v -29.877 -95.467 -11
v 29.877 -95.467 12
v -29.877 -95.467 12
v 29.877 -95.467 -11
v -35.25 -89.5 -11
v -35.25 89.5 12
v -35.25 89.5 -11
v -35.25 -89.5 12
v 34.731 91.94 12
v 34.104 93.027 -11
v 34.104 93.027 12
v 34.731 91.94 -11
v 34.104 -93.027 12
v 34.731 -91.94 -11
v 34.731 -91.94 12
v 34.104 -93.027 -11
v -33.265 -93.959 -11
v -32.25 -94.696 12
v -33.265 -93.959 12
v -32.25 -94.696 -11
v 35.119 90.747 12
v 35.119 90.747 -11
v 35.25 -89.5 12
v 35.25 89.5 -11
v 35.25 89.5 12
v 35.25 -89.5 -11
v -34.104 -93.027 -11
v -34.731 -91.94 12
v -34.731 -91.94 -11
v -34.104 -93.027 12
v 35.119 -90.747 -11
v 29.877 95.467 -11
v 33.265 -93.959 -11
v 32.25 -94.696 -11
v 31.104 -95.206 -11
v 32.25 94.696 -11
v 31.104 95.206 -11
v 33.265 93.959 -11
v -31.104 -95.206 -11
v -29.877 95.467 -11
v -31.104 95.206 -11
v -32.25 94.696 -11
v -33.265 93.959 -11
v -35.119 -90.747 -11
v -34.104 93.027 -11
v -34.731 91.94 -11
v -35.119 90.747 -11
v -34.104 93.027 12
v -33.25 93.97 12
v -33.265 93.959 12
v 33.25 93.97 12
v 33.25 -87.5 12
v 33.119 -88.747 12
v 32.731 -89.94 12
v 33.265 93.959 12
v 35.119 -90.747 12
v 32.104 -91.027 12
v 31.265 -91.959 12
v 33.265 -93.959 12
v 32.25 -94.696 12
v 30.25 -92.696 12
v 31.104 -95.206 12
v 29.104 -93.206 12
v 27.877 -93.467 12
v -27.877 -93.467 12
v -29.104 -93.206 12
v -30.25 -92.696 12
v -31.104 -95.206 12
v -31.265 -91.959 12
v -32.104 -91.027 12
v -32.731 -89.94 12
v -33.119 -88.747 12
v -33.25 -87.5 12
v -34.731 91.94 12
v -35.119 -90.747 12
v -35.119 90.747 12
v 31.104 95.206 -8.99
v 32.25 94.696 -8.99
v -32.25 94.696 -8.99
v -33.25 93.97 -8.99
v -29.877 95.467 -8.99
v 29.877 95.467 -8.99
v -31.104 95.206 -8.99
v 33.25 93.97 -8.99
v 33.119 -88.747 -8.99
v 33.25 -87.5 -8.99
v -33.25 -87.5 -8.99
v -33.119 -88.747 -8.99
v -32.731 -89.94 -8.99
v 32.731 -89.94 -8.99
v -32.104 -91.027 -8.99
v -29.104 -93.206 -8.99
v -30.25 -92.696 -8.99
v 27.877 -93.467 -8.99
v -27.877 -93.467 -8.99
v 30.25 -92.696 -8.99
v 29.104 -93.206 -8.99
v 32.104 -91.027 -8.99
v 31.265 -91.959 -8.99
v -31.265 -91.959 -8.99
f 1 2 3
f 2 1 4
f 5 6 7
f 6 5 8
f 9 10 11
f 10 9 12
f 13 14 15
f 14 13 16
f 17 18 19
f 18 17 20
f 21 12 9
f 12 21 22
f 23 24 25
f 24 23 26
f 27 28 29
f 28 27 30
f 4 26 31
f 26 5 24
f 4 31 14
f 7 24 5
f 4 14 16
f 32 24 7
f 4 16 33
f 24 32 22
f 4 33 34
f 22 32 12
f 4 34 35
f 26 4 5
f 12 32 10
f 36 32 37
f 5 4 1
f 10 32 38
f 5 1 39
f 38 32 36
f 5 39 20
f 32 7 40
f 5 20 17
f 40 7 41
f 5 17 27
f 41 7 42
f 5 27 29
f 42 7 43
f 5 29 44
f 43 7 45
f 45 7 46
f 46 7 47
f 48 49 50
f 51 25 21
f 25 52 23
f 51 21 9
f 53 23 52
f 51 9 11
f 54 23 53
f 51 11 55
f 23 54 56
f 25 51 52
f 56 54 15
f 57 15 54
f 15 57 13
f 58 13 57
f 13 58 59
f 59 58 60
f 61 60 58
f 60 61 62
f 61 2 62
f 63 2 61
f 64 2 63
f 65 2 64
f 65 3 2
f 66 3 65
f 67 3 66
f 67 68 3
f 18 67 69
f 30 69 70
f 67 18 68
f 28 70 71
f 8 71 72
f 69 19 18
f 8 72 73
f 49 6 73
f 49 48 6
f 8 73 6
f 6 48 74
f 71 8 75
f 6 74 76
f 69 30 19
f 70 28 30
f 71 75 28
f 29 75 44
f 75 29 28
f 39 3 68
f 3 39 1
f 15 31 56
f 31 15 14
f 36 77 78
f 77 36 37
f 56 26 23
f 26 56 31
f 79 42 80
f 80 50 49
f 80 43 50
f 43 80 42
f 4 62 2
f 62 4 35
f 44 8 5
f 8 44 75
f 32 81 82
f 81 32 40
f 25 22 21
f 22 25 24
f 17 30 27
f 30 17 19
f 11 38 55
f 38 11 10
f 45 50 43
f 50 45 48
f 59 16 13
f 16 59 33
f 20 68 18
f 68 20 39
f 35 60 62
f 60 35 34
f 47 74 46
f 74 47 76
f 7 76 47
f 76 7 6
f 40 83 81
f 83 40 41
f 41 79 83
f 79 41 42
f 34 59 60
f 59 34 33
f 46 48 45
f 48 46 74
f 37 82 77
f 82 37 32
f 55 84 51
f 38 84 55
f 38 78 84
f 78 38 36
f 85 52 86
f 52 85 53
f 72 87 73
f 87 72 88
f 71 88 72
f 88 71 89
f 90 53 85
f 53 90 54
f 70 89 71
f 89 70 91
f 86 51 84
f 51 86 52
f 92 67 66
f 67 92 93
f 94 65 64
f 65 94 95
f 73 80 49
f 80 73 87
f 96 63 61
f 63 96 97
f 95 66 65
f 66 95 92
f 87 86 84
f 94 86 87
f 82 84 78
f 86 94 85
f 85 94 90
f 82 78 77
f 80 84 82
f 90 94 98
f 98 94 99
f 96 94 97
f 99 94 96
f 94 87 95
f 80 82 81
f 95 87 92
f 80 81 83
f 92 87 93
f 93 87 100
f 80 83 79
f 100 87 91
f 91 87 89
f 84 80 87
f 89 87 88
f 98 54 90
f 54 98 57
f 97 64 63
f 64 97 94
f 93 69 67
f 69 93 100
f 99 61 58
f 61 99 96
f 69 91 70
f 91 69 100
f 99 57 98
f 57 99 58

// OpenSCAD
$fn = 30;

case_inner_width = 66.5;
case_inner_length = 175;
case_inner_height = 20;

shell_thickness = 2;
minkowski_d = 12;

outer_width = case_inner_width - (minkowski_d - shell_thickness * 2);

//Outer length minkowski needs to be fully additive, so the rounded corners don't interfere
outer_length = case_inner_length  + shell_thickness * 2;

difference(){
    minkowski(){
        cube([outer_width, outer_length, case_inner_height + shell_thickness], center=true);
        cylinder(d=minkowski_d); // this adds extra 12, only subtracted 8. 2mm walls :)
    }   
        
    minkowski(){
        translate([0,0, shell_thickness/2 + 0.01])
        cube([
                case_inner_width-
                minkowski_d, 
        
                case_inner_length, 
            
                case_inner_height
            ], 
           
            center=true);
        cylinder(d=minkowski_d); // this adds extra 12, only subtracted 8. 2mm walls :)

    }
    translate([0,case_inner_length/2, shell_thickness/2 + 2 + 0.01])
    cube([case_inner_width, 40, case_inner_height+4], center=true);
}
